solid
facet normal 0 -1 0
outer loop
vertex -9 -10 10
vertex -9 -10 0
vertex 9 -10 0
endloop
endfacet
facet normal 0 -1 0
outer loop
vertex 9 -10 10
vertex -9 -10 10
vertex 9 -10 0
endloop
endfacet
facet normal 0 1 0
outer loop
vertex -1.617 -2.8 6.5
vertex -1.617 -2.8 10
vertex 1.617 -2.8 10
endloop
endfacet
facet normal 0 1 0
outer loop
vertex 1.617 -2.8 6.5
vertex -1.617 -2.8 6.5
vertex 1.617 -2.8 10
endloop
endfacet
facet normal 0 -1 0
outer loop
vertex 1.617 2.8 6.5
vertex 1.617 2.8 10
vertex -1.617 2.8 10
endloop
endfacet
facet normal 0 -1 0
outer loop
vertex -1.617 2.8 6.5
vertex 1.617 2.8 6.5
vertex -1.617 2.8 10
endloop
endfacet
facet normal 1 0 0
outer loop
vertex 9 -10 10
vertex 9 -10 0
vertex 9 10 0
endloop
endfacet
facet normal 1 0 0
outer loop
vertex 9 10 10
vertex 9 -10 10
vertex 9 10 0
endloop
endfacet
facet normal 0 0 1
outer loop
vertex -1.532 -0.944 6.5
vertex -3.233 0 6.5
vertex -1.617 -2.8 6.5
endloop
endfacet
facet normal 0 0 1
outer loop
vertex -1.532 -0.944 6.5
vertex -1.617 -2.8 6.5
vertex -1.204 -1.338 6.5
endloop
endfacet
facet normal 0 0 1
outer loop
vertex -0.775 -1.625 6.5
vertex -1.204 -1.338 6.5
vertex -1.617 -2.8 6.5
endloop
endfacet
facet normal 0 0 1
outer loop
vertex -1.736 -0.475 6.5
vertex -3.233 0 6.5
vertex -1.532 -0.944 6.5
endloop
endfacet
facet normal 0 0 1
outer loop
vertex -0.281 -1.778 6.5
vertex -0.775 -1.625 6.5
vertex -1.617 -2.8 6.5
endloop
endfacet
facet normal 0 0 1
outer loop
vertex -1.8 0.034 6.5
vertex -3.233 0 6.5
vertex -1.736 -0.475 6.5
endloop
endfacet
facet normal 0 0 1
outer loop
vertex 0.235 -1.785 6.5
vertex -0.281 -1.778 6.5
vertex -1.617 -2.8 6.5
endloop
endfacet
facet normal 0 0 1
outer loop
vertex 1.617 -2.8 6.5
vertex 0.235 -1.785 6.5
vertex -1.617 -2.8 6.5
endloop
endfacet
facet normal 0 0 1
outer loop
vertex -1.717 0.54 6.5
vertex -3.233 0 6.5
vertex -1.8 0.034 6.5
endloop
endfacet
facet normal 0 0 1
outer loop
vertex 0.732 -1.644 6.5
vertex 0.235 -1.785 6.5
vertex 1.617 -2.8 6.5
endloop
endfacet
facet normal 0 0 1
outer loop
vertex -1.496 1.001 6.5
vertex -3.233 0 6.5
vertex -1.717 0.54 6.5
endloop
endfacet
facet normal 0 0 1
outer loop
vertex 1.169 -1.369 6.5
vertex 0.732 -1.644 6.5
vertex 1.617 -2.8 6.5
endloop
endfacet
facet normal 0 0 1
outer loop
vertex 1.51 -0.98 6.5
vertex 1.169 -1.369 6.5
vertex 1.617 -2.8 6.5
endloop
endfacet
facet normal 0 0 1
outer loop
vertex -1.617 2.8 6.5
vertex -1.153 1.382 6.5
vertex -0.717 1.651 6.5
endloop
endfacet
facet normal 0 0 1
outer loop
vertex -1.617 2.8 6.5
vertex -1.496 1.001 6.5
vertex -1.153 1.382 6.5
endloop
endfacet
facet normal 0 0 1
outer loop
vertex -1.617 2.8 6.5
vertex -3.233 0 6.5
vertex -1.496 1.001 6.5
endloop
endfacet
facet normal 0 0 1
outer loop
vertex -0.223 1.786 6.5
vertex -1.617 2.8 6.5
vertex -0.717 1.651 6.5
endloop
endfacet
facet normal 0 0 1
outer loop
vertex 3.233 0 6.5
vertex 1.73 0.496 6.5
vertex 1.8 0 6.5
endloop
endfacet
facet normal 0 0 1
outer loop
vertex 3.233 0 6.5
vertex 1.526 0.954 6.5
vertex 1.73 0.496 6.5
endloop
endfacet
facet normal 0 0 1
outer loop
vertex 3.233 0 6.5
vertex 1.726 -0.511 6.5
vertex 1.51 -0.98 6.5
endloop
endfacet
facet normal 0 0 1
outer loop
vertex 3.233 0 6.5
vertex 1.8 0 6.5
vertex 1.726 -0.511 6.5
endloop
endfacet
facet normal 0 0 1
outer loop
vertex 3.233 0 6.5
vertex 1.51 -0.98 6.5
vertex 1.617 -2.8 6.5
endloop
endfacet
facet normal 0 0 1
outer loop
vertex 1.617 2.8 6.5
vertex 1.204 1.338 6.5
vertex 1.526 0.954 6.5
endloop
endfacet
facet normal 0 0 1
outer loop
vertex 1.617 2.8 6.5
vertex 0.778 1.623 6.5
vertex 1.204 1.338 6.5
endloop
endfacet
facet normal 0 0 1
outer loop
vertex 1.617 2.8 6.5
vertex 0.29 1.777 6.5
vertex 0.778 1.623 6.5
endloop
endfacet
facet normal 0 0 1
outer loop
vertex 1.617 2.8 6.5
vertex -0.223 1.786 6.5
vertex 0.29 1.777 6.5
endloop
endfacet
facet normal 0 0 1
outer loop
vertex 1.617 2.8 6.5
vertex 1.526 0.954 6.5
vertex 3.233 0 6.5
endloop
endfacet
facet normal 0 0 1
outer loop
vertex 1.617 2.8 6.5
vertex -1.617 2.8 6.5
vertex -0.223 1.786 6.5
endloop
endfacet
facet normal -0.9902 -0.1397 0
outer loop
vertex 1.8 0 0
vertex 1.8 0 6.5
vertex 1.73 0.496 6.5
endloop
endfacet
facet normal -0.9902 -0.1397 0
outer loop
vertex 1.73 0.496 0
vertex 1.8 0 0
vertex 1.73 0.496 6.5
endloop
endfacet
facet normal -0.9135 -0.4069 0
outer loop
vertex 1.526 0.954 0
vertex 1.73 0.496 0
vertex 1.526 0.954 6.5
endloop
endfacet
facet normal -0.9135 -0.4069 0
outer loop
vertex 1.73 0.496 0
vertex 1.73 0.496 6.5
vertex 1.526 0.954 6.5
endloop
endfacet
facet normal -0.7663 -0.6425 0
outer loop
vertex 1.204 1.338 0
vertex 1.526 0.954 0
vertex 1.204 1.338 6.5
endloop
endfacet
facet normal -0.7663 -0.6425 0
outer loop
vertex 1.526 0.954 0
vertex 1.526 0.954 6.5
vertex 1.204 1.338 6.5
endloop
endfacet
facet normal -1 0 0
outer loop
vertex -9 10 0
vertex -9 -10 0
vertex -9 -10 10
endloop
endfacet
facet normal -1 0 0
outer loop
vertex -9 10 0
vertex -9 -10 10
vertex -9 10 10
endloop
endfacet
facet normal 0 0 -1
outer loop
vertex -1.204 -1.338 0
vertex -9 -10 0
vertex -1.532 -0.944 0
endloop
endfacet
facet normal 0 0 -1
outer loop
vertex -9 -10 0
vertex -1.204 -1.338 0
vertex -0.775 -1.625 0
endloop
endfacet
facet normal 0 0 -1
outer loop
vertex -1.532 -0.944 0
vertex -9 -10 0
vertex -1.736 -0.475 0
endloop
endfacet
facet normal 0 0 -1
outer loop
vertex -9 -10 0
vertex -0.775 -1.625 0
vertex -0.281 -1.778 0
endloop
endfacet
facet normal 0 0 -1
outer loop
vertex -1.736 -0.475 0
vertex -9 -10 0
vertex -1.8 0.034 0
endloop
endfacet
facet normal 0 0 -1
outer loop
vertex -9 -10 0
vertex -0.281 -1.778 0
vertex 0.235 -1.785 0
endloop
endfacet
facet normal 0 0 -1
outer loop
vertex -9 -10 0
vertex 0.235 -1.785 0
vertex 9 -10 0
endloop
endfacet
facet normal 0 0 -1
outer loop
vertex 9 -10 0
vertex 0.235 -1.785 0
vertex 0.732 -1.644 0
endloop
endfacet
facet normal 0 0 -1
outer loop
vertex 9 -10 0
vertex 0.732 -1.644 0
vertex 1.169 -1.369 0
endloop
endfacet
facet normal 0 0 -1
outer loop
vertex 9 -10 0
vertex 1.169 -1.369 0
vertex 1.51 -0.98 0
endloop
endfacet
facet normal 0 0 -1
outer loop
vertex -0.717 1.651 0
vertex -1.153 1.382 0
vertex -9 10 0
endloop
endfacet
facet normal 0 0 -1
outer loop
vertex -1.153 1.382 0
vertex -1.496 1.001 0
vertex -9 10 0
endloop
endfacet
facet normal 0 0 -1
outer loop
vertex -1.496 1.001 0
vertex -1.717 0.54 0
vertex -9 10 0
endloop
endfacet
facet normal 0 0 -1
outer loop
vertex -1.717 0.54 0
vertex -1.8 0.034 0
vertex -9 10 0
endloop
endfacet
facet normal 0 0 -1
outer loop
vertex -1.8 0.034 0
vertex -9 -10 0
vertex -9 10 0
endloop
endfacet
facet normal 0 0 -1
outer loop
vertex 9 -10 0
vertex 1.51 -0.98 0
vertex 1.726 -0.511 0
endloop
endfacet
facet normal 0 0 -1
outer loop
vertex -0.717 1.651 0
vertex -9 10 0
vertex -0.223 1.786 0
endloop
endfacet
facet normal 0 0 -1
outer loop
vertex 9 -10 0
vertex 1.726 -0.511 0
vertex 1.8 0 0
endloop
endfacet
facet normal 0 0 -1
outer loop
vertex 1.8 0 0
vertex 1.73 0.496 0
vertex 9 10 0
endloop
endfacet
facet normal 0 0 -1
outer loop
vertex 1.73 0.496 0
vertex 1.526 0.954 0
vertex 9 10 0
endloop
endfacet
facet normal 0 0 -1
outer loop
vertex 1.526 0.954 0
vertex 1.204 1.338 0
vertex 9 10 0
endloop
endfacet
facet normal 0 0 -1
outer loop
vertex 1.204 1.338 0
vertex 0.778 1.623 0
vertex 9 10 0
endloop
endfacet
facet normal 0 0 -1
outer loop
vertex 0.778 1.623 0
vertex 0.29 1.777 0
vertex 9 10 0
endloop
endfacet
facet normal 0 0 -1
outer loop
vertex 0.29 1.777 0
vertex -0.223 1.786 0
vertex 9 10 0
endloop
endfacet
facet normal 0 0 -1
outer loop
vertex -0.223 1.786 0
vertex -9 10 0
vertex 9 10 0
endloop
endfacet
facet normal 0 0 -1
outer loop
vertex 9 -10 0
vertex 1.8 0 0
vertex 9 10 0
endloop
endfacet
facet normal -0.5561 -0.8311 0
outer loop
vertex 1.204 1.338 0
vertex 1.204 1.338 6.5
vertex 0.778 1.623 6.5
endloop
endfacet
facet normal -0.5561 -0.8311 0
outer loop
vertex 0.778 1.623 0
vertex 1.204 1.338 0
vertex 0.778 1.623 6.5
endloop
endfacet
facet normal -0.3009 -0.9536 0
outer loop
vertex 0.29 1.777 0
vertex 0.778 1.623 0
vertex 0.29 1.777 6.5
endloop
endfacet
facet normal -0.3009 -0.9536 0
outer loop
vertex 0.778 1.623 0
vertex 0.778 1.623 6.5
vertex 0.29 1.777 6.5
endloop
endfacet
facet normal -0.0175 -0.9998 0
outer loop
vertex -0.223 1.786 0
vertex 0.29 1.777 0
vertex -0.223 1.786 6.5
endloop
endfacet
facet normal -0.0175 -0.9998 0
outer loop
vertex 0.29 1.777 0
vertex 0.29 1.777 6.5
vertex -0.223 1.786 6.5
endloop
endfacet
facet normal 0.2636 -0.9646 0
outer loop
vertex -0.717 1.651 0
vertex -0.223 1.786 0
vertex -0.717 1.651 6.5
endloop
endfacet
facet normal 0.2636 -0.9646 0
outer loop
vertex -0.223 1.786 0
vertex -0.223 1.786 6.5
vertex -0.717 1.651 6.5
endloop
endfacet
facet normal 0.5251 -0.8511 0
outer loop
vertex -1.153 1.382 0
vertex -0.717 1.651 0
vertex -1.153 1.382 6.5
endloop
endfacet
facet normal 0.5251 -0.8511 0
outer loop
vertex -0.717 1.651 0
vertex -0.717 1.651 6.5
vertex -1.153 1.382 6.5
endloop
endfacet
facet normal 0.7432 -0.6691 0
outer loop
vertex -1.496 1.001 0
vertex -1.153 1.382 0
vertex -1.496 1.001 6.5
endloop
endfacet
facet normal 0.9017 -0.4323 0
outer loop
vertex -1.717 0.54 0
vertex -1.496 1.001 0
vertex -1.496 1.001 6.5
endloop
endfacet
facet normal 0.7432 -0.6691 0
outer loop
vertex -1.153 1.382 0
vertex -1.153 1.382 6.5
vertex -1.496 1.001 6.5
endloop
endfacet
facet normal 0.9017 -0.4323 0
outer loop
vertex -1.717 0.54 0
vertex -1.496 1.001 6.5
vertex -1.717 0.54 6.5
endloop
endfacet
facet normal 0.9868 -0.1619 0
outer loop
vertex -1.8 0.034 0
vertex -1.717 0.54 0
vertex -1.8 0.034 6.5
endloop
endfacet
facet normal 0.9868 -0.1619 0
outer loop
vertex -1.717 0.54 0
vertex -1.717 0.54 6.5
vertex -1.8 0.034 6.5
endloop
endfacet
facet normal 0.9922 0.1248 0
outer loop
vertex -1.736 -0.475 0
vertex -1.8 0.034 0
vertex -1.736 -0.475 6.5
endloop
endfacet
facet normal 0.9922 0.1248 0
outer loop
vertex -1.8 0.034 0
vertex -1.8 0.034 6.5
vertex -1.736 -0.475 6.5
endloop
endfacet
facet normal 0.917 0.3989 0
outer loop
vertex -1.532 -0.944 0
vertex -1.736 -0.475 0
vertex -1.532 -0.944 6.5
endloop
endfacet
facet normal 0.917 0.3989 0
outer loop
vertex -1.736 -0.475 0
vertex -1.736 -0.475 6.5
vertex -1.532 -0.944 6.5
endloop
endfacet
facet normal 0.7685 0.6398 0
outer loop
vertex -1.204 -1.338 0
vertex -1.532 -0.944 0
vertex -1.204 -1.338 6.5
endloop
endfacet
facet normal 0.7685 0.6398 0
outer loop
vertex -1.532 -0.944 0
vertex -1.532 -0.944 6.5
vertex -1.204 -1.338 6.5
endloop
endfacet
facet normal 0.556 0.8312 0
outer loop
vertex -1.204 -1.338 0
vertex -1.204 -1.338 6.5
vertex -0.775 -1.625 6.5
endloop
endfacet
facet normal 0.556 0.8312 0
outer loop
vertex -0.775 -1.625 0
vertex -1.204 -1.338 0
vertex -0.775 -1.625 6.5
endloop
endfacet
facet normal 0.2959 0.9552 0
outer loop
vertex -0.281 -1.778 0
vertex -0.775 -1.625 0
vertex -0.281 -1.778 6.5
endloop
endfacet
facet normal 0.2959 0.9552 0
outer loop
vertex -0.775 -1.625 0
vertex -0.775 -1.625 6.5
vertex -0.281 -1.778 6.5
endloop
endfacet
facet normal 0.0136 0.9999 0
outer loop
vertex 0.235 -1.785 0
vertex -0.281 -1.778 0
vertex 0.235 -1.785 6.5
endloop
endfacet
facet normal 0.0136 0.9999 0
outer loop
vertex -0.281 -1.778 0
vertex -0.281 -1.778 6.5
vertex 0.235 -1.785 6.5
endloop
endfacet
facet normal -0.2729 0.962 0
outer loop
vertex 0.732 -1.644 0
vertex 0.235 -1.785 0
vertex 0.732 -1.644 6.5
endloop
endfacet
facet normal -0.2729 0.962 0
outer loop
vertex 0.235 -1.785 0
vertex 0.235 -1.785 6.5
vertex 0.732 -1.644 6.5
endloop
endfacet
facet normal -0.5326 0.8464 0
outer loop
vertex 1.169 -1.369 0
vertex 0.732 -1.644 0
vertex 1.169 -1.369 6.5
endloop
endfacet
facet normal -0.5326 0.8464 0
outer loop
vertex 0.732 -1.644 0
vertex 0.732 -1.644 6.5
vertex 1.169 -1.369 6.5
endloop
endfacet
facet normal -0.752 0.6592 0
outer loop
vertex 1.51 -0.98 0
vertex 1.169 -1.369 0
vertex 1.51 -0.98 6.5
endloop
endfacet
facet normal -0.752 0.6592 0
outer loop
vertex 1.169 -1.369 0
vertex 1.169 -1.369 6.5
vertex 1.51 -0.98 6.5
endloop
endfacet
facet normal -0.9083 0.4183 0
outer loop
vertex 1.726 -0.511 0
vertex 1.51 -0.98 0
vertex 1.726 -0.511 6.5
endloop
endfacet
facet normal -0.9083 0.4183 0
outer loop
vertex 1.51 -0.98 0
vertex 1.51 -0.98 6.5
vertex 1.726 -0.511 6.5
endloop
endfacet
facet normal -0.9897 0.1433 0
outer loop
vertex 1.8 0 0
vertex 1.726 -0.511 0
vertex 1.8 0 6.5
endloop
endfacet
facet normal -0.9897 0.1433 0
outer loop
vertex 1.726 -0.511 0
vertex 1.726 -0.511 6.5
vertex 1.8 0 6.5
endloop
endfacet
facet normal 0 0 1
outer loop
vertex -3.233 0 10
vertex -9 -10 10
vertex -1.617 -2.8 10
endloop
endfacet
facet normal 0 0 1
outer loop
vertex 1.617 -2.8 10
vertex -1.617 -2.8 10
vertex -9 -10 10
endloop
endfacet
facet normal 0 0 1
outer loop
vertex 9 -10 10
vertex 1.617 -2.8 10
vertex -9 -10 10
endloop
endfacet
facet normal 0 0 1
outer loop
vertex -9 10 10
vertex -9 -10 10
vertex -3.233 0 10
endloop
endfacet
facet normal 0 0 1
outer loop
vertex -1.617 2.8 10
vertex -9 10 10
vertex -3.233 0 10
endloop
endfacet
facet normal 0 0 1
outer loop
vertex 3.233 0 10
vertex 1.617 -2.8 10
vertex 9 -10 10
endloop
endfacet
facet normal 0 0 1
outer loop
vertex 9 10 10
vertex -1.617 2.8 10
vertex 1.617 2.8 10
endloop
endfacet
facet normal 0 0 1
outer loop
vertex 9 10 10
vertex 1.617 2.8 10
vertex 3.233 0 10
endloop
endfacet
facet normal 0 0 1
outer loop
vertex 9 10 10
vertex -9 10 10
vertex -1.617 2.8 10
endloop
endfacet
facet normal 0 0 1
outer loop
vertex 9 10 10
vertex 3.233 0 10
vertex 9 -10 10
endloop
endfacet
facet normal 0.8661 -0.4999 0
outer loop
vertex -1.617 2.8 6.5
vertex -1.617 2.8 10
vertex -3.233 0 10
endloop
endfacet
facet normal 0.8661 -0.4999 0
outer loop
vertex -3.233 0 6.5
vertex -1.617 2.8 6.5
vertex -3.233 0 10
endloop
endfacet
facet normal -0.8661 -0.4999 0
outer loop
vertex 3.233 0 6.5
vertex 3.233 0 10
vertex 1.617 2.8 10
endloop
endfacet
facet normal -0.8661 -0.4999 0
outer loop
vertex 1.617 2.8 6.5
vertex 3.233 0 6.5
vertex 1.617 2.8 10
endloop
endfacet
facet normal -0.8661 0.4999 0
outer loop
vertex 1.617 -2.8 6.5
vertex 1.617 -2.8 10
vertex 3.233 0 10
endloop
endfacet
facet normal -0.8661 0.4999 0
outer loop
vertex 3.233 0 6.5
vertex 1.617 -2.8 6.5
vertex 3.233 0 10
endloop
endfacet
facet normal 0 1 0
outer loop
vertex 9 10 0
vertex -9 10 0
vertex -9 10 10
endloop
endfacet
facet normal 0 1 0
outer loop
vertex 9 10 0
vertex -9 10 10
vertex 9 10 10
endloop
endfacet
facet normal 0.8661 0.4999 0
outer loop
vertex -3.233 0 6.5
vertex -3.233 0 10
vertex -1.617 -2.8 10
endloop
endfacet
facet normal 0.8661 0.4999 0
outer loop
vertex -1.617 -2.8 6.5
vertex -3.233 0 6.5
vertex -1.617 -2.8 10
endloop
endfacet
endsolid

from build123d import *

# Parameters (mm, degrees)
SKETCH1_W           = 18
SKETCH1_H           = 20
BOSS_EXTRUDE1_DEPTH = 10
CUT_EXTRUDE1_DEPTH  = 17.763054614
CUT_EXTRUDE2_DEPTH  = 3.5


with BuildPart() as part:
    # Sketch1 → Boss-Extrude1 (new body)
    with BuildSketch(Plane.XY):
        Rectangle(SKETCH1_W, SKETCH1_H)
    extrude(amount=BOSS_EXTRUDE1_DEPTH)

    # Sketch2 → Cut-Extrude1 (cut, through all)
    with BuildSketch(Plane.XY.offset(10)):
        with BuildLine():
            ThreePointArc((1.8, 0), (1.644300114, 0.732309453), (1.204136517, 1.337929463))
            Line((1.204136517, 1.337929463), (-1.204136517, -1.337929463))
            ThreePointArc((-1.204136517, -1.337929463), (0.732309453, -1.644300114), (1.8, 0))
        make_face()
        with BuildLine():
            Line((-1.204136517, -1.337929463), (1.204136517, 1.337929463))
            ThreePointArc((1.204136517, 1.337929463), (-1.337929463, 1.204136517), (-1.204136517, -1.337929463))
        make_face()
    extrude(amount=-CUT_EXTRUDE1_DEPTH, mode=Mode.SUBTRACT)

    # Sketch3 → Cut-Extrude2 (cut)
    with BuildSketch(Plane.XY.offset(10)):
        Polygon((1.616580754, 2.8), (-1.616580754, 2.8), (-3.233161507, 0), (-1.616580754, -2.8), (1.616580754, -2.8), (3.233161507, 0), align=None)
    extrude(amount=-CUT_EXTRUDE2_DEPTH, mode=Mode.SUBTRACT)


solid = part.part
